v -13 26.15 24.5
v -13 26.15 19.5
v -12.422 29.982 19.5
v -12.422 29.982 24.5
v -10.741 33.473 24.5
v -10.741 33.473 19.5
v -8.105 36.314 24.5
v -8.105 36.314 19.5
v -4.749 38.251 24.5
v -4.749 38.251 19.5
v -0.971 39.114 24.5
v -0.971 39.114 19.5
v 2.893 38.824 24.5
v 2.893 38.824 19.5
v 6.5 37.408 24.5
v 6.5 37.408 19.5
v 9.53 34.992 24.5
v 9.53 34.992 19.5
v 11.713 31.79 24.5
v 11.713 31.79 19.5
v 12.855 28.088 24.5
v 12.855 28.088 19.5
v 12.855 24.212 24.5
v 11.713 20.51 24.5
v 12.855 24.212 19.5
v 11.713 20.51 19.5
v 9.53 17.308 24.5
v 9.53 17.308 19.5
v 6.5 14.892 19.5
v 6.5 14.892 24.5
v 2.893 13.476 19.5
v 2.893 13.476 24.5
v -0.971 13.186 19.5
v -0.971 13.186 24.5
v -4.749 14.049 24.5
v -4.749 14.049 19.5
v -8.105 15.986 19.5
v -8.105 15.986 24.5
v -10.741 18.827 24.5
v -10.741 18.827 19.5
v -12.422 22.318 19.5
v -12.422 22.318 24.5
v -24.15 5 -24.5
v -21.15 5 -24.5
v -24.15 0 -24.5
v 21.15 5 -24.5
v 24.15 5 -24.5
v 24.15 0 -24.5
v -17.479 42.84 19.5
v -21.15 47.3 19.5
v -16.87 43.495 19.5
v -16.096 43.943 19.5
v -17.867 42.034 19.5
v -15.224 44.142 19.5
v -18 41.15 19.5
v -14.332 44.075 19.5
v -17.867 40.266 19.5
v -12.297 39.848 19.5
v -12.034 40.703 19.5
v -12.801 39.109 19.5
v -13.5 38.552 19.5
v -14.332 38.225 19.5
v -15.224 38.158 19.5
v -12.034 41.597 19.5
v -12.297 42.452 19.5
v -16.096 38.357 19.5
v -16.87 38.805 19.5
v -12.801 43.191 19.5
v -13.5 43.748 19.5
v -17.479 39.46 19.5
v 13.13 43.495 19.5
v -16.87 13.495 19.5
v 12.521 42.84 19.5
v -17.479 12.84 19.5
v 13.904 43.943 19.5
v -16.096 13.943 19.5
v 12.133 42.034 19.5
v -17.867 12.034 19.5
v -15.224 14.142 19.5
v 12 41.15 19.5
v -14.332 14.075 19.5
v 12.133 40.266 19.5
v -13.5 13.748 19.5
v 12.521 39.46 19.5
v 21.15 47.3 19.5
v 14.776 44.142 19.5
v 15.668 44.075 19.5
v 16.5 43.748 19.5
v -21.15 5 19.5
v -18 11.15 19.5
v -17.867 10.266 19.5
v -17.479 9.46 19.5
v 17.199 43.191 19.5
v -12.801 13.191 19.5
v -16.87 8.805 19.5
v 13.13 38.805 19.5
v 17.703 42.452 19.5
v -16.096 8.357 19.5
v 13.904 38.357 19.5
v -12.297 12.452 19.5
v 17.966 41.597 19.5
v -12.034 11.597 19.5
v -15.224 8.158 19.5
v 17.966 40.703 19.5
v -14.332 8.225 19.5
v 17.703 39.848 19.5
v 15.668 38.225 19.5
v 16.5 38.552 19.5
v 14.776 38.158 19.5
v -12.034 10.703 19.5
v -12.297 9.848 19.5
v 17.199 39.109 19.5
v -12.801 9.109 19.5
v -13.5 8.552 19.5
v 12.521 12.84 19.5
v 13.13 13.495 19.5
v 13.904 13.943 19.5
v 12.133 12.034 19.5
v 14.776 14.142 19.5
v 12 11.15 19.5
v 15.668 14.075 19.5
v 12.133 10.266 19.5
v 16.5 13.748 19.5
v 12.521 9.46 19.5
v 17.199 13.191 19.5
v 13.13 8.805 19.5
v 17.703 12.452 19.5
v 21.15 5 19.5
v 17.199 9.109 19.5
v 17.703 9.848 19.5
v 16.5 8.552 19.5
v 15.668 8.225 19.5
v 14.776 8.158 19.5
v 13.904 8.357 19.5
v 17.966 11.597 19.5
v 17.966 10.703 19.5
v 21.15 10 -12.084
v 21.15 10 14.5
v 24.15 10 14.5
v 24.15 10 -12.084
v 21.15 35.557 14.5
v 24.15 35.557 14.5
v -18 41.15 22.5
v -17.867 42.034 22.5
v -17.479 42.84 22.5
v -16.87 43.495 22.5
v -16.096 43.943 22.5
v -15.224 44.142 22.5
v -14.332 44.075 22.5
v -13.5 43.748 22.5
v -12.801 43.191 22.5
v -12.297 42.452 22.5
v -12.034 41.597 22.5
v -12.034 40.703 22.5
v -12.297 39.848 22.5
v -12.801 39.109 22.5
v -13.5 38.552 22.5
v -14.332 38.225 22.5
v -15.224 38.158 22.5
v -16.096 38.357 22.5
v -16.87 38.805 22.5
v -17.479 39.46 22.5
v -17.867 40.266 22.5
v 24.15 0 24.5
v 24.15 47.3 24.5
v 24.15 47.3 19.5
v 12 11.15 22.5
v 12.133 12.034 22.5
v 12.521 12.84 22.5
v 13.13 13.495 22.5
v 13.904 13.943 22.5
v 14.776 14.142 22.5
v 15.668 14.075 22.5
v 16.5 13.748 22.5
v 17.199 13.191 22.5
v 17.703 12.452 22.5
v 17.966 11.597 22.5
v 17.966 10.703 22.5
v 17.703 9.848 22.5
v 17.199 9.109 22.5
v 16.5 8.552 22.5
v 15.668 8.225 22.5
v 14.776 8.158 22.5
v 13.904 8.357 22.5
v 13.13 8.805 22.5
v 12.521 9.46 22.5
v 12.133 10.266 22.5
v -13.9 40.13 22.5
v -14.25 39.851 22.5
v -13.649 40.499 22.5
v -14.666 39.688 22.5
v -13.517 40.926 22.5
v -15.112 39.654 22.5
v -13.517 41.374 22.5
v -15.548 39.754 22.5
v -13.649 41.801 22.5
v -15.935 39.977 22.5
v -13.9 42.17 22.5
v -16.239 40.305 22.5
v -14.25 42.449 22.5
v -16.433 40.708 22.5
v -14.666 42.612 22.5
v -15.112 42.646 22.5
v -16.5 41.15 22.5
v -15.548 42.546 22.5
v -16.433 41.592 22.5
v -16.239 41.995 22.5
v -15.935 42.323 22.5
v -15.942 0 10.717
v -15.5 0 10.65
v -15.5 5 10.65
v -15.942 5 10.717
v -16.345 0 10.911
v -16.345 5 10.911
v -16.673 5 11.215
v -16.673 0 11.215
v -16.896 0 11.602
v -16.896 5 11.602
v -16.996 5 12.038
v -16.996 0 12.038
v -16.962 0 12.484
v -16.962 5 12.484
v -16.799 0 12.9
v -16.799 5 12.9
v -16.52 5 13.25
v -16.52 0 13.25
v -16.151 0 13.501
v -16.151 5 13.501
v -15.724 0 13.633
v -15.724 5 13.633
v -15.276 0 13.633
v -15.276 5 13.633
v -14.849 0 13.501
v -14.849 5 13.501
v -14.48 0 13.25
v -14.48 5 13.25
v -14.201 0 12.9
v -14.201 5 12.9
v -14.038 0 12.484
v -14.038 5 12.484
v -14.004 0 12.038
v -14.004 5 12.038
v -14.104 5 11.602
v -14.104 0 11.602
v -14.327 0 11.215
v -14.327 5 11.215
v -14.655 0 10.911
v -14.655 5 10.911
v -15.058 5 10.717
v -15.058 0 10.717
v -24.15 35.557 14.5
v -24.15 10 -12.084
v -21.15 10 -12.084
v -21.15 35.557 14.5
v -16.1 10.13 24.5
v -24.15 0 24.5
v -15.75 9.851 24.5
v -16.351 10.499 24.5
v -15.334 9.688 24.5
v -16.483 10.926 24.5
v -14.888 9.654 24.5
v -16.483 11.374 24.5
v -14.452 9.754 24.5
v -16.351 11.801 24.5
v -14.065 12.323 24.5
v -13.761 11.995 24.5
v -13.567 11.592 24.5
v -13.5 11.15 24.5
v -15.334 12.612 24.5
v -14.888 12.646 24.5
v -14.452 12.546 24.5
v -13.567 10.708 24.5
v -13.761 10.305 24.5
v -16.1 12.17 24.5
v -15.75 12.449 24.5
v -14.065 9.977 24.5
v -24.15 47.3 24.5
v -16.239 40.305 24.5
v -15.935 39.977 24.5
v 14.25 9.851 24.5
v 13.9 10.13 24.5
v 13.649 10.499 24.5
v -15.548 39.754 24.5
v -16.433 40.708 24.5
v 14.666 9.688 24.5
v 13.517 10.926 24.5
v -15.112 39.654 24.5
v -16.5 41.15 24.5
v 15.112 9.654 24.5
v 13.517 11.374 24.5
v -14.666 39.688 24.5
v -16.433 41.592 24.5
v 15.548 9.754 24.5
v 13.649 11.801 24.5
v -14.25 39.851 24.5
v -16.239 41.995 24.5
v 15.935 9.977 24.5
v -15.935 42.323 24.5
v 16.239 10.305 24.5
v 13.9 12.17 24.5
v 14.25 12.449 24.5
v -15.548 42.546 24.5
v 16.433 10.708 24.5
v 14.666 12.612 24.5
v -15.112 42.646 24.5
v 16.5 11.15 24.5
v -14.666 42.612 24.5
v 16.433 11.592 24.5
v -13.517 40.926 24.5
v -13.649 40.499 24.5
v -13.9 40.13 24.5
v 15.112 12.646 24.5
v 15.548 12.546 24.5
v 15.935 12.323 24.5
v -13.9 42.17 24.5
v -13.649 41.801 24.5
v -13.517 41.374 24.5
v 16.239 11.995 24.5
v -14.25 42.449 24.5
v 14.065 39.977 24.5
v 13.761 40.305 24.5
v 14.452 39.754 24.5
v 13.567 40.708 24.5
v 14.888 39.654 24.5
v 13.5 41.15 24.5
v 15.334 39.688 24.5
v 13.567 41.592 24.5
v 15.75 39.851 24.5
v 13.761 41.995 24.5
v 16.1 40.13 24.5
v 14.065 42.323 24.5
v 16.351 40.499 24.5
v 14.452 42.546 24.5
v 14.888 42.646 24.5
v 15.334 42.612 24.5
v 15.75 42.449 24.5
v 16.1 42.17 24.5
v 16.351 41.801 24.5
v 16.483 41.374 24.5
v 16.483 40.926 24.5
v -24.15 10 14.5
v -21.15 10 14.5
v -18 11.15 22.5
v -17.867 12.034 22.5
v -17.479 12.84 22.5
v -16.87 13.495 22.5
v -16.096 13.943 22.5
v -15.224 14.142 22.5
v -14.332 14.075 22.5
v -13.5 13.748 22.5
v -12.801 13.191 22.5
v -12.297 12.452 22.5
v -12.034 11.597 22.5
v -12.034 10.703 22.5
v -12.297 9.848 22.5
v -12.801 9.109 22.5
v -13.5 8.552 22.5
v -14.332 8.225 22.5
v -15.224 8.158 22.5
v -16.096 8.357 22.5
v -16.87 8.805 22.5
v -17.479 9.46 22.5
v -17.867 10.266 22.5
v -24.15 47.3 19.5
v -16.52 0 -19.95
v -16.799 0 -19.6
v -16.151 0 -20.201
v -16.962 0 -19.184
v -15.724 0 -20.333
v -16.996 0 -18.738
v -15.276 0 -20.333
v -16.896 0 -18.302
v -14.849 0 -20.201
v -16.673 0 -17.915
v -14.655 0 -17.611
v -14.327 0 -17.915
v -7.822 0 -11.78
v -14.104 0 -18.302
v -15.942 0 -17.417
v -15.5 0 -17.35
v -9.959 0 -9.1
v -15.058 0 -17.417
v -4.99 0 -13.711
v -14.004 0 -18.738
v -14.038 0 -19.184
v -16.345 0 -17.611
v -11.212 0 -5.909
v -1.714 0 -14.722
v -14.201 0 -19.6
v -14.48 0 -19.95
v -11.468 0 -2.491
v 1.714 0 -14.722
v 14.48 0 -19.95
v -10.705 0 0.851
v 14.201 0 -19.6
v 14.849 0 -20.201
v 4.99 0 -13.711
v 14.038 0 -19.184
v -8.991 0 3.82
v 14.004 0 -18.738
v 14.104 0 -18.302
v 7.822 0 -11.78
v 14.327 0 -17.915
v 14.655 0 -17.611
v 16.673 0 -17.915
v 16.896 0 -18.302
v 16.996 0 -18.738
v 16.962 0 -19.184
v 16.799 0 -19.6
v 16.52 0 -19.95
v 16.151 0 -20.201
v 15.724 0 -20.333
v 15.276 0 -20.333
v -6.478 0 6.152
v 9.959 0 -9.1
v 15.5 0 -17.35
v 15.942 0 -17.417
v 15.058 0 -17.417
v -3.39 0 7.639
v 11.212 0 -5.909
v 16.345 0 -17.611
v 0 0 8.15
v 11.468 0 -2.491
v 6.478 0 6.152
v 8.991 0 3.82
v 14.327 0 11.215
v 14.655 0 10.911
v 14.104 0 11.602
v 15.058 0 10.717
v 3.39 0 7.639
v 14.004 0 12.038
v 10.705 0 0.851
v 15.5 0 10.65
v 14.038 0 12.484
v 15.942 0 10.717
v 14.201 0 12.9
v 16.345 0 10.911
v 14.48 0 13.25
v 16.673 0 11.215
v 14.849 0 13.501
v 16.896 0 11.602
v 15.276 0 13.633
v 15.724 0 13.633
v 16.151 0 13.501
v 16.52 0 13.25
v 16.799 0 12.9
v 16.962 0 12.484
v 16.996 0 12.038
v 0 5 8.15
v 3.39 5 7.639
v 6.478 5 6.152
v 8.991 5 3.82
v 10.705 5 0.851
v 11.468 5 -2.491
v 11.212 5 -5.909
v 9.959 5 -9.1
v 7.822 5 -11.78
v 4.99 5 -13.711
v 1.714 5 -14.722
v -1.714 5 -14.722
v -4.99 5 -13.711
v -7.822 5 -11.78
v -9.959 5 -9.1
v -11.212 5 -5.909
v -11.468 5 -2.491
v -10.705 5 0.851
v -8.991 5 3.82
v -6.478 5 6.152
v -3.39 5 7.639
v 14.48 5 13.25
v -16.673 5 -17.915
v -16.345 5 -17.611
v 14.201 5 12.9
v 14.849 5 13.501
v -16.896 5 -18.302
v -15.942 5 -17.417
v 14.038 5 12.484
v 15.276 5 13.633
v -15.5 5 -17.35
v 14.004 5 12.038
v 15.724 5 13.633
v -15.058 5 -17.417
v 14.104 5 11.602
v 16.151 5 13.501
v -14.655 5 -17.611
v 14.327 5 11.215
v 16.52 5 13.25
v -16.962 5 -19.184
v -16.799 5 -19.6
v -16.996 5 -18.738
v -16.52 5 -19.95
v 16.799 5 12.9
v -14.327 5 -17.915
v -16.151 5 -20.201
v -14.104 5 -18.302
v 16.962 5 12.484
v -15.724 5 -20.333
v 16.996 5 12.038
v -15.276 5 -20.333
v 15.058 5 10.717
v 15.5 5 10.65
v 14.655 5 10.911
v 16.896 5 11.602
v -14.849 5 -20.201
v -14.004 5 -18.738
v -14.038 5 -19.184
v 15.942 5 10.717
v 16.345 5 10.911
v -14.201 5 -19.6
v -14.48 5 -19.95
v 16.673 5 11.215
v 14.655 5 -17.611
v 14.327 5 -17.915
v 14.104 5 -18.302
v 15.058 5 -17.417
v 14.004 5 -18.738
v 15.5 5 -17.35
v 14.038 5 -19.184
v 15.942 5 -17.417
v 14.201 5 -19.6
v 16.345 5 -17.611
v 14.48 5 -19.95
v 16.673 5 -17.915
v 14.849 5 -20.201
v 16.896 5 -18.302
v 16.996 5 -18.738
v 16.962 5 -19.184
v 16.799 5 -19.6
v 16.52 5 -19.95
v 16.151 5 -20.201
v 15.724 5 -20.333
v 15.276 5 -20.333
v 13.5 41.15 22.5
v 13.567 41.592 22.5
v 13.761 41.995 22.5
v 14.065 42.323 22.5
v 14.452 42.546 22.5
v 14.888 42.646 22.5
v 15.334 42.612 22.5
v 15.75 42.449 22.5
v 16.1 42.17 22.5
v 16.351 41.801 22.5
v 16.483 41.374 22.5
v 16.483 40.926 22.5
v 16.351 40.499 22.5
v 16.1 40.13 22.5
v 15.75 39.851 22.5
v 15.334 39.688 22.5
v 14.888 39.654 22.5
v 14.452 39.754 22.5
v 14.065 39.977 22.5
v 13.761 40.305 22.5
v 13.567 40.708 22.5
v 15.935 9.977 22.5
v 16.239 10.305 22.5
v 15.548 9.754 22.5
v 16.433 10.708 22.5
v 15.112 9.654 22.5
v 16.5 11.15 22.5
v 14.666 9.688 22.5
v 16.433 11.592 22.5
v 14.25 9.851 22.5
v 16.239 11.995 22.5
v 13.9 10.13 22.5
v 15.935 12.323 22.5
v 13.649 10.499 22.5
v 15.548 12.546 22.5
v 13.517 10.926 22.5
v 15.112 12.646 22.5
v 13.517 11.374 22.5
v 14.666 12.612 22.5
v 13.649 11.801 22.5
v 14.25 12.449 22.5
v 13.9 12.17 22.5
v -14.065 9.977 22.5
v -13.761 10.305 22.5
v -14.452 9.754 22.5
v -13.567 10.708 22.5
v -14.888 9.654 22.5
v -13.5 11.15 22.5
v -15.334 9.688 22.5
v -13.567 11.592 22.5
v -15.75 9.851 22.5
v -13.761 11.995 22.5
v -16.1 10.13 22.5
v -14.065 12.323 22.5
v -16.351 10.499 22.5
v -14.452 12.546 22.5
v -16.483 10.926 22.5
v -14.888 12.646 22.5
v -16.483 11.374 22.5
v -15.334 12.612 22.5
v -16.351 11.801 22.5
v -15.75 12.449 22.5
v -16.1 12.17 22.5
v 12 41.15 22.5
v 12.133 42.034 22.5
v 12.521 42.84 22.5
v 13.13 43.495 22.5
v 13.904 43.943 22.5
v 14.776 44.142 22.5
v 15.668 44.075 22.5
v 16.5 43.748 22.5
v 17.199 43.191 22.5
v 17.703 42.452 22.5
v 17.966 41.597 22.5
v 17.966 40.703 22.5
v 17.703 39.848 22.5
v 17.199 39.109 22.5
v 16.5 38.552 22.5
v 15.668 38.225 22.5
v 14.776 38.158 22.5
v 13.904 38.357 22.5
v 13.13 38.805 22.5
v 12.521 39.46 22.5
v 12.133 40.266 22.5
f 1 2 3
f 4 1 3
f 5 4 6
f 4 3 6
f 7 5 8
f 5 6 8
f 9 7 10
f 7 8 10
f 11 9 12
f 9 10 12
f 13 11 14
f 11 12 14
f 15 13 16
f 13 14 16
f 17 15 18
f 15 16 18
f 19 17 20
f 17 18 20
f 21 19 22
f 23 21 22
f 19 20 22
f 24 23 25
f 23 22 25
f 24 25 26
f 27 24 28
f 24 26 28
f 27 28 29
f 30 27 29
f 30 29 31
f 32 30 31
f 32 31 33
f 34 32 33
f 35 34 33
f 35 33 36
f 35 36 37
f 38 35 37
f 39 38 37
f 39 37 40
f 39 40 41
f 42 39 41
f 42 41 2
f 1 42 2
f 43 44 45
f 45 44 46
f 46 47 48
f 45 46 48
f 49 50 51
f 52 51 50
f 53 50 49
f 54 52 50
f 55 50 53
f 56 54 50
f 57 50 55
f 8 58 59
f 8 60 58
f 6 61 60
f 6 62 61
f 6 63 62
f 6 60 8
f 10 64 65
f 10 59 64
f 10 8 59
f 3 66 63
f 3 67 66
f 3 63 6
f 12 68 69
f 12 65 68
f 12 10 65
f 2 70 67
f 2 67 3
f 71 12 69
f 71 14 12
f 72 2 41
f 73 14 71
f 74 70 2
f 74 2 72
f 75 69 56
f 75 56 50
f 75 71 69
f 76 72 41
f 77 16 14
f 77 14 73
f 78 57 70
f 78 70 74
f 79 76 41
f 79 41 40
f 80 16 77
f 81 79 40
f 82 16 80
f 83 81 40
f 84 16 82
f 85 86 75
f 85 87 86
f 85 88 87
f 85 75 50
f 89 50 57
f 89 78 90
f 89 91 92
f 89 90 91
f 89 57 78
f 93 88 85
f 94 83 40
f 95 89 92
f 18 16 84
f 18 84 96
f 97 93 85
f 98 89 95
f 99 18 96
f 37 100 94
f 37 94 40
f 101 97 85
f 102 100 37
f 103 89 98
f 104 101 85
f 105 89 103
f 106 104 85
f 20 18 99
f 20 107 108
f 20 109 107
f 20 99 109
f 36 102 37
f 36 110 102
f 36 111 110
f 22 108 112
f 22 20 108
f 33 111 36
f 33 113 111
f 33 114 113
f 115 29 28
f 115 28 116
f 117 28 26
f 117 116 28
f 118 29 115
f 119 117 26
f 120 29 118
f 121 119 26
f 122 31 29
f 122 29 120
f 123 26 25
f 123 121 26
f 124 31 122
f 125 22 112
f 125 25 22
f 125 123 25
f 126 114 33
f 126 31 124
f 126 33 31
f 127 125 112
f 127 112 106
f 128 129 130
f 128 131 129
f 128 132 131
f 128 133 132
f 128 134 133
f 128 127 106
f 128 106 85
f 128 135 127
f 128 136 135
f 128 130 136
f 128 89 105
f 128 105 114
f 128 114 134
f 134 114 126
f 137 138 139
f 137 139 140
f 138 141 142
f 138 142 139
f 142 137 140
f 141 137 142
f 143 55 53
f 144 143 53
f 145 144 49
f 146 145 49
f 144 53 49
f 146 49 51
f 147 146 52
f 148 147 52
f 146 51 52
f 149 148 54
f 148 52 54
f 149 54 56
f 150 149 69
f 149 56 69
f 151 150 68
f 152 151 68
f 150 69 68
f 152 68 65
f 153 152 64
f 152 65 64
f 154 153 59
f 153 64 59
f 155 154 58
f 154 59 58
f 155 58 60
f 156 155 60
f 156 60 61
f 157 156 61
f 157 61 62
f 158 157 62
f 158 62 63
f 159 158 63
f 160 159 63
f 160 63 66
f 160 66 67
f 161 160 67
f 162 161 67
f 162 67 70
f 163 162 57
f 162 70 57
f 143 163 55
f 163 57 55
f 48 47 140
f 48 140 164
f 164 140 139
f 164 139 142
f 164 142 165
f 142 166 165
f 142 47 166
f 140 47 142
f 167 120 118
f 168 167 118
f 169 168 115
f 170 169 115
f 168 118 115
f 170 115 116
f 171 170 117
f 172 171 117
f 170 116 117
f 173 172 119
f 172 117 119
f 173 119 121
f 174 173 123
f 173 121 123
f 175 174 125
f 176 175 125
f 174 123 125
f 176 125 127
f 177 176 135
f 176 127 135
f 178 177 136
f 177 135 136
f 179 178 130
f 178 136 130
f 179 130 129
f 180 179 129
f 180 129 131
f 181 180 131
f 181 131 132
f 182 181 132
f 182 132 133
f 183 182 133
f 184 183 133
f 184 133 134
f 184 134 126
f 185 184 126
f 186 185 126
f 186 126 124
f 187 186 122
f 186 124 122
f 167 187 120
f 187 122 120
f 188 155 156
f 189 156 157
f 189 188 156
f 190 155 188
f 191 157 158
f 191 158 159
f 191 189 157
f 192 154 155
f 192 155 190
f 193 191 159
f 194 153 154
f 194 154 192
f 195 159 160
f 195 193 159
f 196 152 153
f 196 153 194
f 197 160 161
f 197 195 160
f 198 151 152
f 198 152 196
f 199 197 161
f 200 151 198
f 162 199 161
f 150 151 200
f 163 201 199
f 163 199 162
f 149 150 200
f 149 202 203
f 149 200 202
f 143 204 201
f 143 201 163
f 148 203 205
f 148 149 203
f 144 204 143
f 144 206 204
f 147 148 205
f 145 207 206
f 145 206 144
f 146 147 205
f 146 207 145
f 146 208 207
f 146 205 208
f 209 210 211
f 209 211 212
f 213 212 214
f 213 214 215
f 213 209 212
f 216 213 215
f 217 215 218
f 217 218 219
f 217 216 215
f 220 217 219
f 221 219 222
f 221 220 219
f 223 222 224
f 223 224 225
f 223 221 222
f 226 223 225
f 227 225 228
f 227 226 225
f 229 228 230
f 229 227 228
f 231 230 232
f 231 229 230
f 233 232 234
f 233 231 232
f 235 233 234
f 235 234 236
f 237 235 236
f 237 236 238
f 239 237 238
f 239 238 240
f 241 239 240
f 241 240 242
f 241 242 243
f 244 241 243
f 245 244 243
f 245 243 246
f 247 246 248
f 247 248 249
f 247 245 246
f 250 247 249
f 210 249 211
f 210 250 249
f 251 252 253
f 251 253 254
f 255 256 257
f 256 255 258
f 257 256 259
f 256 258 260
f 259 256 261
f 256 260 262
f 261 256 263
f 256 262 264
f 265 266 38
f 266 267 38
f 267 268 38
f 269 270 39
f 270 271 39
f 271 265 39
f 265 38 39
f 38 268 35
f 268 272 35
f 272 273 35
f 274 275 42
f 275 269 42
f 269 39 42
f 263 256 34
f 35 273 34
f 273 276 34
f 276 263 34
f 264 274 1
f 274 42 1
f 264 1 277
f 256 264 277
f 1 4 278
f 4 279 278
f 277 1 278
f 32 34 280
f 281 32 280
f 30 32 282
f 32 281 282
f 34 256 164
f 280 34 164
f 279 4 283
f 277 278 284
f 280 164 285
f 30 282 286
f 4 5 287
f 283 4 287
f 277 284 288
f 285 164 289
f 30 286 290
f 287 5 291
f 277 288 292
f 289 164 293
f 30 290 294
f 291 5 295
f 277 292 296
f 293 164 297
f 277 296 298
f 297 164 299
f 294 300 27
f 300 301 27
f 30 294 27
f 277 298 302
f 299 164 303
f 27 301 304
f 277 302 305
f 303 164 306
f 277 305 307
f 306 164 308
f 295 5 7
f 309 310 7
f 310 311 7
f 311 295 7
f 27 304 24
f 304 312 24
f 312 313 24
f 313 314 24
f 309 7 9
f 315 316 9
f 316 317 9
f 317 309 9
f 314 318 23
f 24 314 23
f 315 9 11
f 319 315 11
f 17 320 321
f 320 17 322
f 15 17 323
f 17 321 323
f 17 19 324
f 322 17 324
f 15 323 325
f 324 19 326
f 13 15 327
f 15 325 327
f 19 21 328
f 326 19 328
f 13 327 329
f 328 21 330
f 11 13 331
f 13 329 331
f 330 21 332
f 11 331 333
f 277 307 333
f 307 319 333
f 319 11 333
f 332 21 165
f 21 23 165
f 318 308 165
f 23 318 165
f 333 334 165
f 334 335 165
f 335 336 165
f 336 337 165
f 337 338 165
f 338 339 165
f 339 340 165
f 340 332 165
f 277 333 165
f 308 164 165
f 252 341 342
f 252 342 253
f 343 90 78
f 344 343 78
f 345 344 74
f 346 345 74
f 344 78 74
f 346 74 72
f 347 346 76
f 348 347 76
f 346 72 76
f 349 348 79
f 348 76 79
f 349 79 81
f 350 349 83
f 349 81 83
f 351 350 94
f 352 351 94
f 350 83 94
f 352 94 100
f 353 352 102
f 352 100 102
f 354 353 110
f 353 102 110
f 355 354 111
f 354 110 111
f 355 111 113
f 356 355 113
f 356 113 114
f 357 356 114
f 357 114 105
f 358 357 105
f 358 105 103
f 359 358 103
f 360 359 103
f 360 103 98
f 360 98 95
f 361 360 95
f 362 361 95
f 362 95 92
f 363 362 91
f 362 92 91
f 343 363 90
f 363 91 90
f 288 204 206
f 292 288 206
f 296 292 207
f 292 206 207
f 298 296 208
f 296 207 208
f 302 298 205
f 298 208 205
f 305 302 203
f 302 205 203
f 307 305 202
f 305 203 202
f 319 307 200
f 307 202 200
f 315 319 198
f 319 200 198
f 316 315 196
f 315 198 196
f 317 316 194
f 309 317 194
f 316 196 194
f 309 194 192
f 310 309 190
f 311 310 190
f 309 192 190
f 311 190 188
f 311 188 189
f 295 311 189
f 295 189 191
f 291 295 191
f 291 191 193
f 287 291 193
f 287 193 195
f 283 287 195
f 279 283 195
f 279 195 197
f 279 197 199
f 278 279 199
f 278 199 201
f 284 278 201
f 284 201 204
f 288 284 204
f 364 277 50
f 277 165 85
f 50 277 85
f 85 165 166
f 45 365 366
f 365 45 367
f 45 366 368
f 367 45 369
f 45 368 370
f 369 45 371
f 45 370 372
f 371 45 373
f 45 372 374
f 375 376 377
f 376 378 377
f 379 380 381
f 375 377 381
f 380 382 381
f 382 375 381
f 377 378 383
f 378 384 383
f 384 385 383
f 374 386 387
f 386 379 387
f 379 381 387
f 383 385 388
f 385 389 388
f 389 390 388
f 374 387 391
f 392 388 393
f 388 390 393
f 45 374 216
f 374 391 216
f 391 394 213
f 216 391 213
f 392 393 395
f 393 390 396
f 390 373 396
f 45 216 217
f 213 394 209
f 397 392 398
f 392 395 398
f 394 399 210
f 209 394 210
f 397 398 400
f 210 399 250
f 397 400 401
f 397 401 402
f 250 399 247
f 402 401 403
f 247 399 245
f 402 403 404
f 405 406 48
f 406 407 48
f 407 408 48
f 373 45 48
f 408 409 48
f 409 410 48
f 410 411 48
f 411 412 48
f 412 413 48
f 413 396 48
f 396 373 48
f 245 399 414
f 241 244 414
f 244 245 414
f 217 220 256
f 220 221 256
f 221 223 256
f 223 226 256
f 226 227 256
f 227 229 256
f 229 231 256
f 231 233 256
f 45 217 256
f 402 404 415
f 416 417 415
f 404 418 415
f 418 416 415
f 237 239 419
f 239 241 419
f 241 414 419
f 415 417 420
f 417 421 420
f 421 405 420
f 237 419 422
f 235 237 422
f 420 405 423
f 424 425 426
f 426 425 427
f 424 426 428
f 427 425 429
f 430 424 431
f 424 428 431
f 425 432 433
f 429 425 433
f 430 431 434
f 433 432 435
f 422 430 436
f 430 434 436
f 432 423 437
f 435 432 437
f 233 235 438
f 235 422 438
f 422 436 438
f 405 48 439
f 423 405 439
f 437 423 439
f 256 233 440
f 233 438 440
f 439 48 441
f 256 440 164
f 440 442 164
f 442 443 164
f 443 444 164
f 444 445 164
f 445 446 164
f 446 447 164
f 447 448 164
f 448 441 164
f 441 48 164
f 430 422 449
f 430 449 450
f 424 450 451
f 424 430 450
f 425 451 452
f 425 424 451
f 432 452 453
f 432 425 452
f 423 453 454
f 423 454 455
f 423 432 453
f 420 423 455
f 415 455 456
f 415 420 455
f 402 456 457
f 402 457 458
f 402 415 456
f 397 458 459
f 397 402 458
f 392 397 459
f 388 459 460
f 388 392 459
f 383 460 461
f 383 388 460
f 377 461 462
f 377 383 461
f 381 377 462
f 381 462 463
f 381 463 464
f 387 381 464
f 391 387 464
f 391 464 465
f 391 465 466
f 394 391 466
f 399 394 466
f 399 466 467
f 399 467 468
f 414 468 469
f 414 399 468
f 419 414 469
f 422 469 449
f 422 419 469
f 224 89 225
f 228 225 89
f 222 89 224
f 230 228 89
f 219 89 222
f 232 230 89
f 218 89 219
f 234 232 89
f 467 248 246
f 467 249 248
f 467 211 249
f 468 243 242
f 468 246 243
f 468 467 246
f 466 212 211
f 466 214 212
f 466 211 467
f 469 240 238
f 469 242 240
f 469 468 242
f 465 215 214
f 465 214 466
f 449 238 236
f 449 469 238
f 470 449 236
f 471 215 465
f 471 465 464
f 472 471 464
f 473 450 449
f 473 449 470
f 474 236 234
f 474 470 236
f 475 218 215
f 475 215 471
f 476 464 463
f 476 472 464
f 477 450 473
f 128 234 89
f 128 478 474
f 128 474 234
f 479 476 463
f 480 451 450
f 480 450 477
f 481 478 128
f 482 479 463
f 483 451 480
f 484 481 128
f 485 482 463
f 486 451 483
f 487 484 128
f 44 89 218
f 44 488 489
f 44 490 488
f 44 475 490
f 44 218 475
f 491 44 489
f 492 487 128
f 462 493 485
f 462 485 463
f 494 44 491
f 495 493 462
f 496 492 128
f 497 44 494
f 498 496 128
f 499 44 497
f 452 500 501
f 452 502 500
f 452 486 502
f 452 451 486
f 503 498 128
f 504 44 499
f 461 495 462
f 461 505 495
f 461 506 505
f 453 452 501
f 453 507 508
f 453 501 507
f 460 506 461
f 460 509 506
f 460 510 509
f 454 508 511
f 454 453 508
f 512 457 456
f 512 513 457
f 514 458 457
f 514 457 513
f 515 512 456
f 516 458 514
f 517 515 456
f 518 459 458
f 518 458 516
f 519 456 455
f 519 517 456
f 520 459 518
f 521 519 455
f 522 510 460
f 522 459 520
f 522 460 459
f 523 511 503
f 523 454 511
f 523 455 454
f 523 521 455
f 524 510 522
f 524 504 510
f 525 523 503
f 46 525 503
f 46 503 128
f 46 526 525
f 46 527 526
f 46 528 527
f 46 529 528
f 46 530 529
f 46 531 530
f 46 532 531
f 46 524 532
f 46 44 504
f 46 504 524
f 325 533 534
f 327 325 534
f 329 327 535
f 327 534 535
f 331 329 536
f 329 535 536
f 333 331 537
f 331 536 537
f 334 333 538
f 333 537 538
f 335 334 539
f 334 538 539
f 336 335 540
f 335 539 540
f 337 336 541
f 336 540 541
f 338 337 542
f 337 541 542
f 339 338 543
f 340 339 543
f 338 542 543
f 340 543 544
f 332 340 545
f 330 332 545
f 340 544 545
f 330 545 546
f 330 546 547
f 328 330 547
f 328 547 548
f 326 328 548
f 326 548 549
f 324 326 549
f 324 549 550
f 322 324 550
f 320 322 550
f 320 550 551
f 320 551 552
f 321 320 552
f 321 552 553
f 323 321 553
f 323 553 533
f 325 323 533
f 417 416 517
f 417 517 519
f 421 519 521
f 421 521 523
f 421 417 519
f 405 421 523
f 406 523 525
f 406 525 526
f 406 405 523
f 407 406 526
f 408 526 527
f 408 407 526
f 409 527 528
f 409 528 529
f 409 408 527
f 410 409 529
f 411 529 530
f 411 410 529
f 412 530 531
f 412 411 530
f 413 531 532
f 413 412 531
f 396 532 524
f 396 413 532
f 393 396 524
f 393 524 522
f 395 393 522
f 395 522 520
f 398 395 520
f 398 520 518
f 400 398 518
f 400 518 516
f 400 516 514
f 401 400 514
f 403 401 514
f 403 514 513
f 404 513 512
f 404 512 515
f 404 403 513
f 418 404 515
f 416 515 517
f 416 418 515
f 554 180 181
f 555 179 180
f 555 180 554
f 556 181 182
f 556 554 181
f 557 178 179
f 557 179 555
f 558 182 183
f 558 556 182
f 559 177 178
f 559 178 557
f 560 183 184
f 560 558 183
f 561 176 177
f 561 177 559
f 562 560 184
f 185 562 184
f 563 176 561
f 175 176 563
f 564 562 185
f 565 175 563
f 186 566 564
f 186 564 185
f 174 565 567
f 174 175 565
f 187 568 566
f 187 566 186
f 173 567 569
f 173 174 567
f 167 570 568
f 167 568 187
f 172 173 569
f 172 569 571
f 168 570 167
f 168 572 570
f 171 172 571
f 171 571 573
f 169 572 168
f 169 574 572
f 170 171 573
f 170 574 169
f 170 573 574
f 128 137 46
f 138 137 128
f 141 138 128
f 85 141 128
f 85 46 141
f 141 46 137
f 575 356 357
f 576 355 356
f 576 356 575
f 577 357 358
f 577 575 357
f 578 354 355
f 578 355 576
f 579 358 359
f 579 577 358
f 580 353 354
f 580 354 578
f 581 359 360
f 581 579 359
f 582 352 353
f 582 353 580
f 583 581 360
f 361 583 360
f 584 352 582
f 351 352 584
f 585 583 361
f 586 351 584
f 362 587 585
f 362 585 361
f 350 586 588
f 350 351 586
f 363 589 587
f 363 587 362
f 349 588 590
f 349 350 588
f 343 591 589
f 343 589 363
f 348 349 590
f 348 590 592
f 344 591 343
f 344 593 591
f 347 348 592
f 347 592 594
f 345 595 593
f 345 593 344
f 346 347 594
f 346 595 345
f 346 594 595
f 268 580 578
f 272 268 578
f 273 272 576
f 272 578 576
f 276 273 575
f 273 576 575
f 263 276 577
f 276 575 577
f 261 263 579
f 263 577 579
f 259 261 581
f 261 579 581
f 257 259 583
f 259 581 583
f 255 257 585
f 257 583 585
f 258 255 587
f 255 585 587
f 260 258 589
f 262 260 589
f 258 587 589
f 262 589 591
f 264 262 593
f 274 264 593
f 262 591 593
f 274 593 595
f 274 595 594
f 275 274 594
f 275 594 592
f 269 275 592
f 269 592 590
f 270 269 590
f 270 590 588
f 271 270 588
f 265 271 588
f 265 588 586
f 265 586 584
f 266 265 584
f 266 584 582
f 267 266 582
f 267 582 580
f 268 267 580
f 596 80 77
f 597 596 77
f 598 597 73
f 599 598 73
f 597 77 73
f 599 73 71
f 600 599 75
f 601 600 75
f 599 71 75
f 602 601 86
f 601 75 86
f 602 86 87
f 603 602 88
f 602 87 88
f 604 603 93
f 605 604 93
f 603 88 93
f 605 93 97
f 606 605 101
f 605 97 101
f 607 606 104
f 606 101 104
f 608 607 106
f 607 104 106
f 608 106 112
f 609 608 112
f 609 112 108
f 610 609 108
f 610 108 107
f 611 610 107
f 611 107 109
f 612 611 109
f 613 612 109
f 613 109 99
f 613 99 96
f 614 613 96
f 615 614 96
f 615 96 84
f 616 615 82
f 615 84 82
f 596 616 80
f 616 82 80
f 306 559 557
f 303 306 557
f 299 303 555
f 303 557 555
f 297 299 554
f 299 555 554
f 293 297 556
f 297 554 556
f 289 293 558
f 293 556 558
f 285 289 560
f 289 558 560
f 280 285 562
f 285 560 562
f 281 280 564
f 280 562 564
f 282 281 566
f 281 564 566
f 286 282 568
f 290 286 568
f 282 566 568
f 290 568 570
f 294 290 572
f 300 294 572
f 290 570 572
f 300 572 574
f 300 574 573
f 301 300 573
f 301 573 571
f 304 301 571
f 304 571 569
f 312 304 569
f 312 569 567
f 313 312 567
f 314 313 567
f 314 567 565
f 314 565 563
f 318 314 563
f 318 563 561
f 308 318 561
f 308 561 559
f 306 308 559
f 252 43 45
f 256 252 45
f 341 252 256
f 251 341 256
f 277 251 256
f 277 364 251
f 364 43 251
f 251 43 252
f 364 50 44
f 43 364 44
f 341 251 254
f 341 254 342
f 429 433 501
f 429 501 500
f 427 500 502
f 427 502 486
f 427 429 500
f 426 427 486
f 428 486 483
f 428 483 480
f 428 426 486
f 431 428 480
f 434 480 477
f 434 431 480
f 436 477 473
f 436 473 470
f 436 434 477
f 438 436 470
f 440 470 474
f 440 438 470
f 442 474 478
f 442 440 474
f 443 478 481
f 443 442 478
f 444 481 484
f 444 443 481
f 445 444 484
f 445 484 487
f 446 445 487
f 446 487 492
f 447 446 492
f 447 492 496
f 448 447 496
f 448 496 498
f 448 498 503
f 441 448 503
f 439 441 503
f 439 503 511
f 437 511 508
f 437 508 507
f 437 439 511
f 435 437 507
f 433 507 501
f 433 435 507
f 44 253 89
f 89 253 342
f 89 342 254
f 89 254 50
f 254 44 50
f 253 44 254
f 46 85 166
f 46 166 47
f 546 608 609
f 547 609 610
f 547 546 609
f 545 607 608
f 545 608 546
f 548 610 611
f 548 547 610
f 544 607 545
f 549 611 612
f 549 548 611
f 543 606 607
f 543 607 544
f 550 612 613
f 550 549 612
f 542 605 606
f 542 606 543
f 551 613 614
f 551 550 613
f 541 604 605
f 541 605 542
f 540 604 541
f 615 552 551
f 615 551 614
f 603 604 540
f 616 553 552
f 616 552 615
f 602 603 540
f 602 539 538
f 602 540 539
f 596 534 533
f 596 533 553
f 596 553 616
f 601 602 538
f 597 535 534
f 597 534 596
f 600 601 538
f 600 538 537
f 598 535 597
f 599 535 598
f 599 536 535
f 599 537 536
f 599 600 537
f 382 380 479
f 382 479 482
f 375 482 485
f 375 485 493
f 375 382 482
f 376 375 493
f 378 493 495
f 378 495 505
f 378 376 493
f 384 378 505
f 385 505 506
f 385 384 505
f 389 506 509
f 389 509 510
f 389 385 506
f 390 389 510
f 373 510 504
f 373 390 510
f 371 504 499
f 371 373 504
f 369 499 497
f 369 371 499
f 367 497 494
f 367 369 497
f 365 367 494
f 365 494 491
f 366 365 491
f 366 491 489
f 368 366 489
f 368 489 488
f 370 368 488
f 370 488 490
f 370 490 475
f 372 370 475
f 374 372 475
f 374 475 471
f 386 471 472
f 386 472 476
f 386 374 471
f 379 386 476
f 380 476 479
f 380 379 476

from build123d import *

# Parameters (mm, degrees)
SKETCH1_W           = 42.3
SKETCH1_H           = 49
SKETCH1_R           = 1.5
SKETCH1_R_2         = 11.5
BOSS_EXTRUDE1_DEPTH = 5
SKETCH2_W           = 42.3
SKETCH2_H           = 5
BOSS_EXTRUDE2_DEPTH = 42.3
SKETCH4_R           = 1.5
SKETCH4_R_2         = 13
CUT_EXTRUDE1_DEPTH  = 68.975087348
BOSS_EXTRUDE3_DEPTH = 3
BOSS_EXTRUDE4_DEPTH = 3
SKETCH8_R           = 3
CUT_EXTRUDE2_DEPTH  = 3
CUT_EXTRUDE3_DEPTH  = 72.905702138


with BuildPart() as part:
    # Sketch1 → Boss-Extrude1 (new body)
    with BuildSketch(Plane(origin=(0, 0, 0), x_dir=(1, 0, 0), z_dir=(0, 1, 0))):
        Rectangle(SKETCH1_W, SKETCH1_H)
        with Locations(Location((-15.5, 18.85, 0), (0, 0, 270))):
            Circle(SKETCH1_R, mode=Mode.SUBTRACT)
        with Locations(Location((15.5, 18.85, 0), (0, 0, 270))):
            Circle(SKETCH1_R, mode=Mode.SUBTRACT)
        with Locations(Location((-15.5, -12.15, 0), (0, 0, 90))):
            Circle(SKETCH1_R, mode=Mode.SUBTRACT)
        with Locations(Location((15.5, -12.15, 0), (0, 0, 90))):
            Circle(SKETCH1_R, mode=Mode.SUBTRACT)
        with Locations(Location((0, 3.35, 0), (0, 0, 270))):
            Circle(SKETCH1_R_2, mode=Mode.SUBTRACT)
    extrude(amount=BOSS_EXTRUDE1_DEPTH)

    # Sketch2 → Boss-Extrude2 (add)
    with BuildSketch(Plane(origin=(0, 5, 0), x_dir=(1, 0, 0), z_dir=(0, 1, 0))):
        with Locations((0, -22)):
            Rectangle(SKETCH2_W, SKETCH2_H)
    extrude(amount=BOSS_EXTRUDE2_DEPTH)

    # Sketch4 → Cut-Extrude1 (cut, through all)
    with BuildSketch(Plane(origin=(0, 0, 19.5), x_dir=(-1, 0, 0), z_dir=(0, 0, -1))):
        with Locations((-15, 41.15)):
            Circle(SKETCH4_R)
        with Locations((15, 41.15)):
            Circle(SKETCH4_R)
        with Locations(Location((-15, 11.15, 0), (0, 0, 180))):
            Circle(SKETCH4_R)
        with Locations(Location((15, 11.15, 0), (0, 0, 180))):
            Circle(SKETCH4_R)
        with Locations((0, 26.15)):
            Circle(SKETCH4_R_2)
    extrude(amount=-CUT_EXTRUDE1_DEPTH, mode=Mode.SUBTRACT)

    # Sketch5 → Boss-Extrude3 (add)
    with BuildSketch(Plane(origin=(21.15, 0, 0), x_dir=(0, 0, -1), z_dir=(1, 0, 0))):
        Polygon((-19.5, 47.3), (24.5, 5), (24.5, 0), (-24.5, 0), (-24.5, 47.3), align=None)
    extrude(amount=BOSS_EXTRUDE3_DEPTH)

    # Sketch6 → Boss-Extrude4 (add)
    with BuildSketch(Plane.ZY.offset(21.15)):
        Polygon((19.5, 47.3), (-24.5, 5), (-24.5, 0), (24.5, 0), (24.5, 47.3), align=None)
    extrude(amount=BOSS_EXTRUDE4_DEPTH)

    # Sketch8 → Cut-Extrude2 (cut)
    with BuildSketch(Plane(origin=(0, 0, 19.5), x_dir=(-1, 0, 0), z_dir=(0, 0, -1))):
        with Locations((-15, 41.15)):
            Circle(SKETCH8_R)
        with Locations((15, 41.15)):
            Circle(SKETCH8_R)
        with Locations((15, 11.15)):
            Circle(SKETCH8_R)
        with Locations((-15, 11.15)):
            Circle(SKETCH8_R)
    extrude(amount=-CUT_EXTRUDE2_DEPTH, mode=Mode.SUBTRACT)

    # Sketch9 → Cut-Extrude3 (cut, through all)
    with BuildSketch(Plane.ZY.offset(24.15)):
        Polygon((-12.084497186, 10), (14.5, 35.557368886), (14.5, 10), align=None)
    extrude(amount=-CUT_EXTRUDE3_DEPTH, mode=Mode.SUBTRACT)


solid = part.part
